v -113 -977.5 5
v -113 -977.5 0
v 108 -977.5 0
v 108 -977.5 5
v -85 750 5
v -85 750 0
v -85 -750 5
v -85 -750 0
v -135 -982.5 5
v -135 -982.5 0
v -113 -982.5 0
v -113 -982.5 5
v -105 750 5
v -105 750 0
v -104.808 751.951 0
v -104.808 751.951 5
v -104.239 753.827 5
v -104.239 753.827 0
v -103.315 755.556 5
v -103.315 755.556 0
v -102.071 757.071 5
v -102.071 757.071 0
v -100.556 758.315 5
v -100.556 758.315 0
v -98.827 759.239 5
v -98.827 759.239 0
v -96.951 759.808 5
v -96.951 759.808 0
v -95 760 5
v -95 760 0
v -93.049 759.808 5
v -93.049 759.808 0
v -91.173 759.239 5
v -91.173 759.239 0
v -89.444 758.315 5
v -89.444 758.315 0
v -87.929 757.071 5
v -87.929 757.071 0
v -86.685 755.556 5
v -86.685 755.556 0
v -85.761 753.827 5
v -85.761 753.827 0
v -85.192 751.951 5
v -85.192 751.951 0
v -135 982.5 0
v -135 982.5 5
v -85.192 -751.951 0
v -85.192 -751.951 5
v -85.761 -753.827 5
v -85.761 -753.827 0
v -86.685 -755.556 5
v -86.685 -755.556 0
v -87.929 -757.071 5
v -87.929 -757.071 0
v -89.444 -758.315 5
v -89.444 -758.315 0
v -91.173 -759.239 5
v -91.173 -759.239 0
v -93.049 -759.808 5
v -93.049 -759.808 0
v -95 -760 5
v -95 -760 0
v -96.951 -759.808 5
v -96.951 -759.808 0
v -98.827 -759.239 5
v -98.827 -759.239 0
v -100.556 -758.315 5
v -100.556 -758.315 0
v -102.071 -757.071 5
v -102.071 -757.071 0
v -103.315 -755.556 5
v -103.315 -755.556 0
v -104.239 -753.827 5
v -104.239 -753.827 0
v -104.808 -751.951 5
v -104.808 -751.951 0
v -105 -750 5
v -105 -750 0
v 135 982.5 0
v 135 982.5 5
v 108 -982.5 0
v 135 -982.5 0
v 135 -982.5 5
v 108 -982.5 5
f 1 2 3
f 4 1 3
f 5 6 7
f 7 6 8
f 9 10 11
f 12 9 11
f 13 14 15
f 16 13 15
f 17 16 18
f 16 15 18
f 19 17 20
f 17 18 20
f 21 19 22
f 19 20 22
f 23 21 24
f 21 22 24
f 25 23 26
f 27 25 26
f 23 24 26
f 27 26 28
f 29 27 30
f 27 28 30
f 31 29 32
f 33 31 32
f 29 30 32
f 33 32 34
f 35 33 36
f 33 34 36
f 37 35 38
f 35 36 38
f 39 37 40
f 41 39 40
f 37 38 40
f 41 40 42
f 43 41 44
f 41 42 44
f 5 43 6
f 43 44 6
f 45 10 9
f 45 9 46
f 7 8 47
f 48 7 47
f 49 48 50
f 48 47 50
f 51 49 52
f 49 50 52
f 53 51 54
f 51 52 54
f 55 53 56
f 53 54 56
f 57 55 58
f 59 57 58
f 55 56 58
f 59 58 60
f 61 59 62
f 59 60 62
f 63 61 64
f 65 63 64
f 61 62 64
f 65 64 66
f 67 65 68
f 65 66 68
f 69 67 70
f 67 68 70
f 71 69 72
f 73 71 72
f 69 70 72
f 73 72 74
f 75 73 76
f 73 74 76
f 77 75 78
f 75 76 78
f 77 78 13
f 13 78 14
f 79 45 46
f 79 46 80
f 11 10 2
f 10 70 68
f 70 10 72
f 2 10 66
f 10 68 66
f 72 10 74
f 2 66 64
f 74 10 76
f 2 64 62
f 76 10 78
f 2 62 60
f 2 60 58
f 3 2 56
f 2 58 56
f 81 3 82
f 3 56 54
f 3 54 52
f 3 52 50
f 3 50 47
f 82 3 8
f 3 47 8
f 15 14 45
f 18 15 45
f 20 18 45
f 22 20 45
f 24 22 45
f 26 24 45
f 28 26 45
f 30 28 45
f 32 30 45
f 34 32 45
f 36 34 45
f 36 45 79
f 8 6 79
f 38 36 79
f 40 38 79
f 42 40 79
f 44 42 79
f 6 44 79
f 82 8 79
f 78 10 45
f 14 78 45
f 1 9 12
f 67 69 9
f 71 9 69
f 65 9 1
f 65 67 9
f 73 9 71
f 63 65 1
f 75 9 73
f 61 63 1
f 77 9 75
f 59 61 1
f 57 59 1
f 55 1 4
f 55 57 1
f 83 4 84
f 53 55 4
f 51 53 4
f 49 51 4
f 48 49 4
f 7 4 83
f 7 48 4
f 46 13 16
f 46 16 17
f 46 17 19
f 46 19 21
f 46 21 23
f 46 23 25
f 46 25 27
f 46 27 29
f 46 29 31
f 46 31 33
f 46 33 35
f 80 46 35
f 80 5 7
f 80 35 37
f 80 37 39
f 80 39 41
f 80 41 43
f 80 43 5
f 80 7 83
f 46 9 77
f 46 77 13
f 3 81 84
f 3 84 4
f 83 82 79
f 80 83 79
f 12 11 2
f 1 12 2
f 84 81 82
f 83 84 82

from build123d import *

# Parameters (mm, degrees)
SKETCH1_W                    = 270
SKETCH1_H                    = 1965
MAIN_PLATE_EXTRUDE_DEPTH     = 5
MOTOR_MOUNT_CUT_DEPTH        = 992.7440446
MOTOR_MOUNT_CUT_DEPTH_BACK   = 992.7440446
SKETCH2_W                    = 221
SKETCH2_H                    = 5
OUTPUT_SHAFT_SLOT_DEPTH      = 992.7440446
OUTPUT_SHAFT_SLOT_DEPTH_BACK = 992.7440446


with BuildPart() as part:
    # Sketch1 → Main plate extrude (new body)
    with BuildSketch(Plane.XY):
        Rectangle(SKETCH1_W, SKETCH1_H)
    extrude(amount=MAIN_PLATE_EXTRUDE_DEPTH)

    # Sketch2 → Motor mount cut (cut, two sides: drawn at the far end of the back side and taken through both)
    with BuildSketch(Plane.XY.offset(5).offset(-MOTOR_MOUNT_CUT_DEPTH_BACK)):
        with Locations((-2.5, -980)):
            Rectangle(SKETCH2_W, SKETCH2_H)
    extrude(amount=MOTOR_MOUNT_CUT_DEPTH + MOTOR_MOUNT_CUT_DEPTH_BACK, mode=Mode.SUBTRACT)

    # Sketch3 → Output shaft slot (cut, two sides: drawn at the far end of the back side and taken through both)
    with BuildSketch(Plane.XY.offset(5).offset(-OUTPUT_SHAFT_SLOT_DEPTH_BACK)):
        with BuildLine():
            Line((-85, 750), (-85, -750))
            ThreePointArc((-85, -750), (-95, -760), (-105, -750))
            Line((-105, -750), (-105, 750))
            ThreePointArc((-105, 750), (-95, 760), (-85, 750))
        make_face()
    extrude(amount=OUTPUT_SHAFT_SLOT_DEPTH + OUTPUT_SHAFT_SLOT_DEPTH_BACK, mode=Mode.SUBTRACT)


solid = part.part
